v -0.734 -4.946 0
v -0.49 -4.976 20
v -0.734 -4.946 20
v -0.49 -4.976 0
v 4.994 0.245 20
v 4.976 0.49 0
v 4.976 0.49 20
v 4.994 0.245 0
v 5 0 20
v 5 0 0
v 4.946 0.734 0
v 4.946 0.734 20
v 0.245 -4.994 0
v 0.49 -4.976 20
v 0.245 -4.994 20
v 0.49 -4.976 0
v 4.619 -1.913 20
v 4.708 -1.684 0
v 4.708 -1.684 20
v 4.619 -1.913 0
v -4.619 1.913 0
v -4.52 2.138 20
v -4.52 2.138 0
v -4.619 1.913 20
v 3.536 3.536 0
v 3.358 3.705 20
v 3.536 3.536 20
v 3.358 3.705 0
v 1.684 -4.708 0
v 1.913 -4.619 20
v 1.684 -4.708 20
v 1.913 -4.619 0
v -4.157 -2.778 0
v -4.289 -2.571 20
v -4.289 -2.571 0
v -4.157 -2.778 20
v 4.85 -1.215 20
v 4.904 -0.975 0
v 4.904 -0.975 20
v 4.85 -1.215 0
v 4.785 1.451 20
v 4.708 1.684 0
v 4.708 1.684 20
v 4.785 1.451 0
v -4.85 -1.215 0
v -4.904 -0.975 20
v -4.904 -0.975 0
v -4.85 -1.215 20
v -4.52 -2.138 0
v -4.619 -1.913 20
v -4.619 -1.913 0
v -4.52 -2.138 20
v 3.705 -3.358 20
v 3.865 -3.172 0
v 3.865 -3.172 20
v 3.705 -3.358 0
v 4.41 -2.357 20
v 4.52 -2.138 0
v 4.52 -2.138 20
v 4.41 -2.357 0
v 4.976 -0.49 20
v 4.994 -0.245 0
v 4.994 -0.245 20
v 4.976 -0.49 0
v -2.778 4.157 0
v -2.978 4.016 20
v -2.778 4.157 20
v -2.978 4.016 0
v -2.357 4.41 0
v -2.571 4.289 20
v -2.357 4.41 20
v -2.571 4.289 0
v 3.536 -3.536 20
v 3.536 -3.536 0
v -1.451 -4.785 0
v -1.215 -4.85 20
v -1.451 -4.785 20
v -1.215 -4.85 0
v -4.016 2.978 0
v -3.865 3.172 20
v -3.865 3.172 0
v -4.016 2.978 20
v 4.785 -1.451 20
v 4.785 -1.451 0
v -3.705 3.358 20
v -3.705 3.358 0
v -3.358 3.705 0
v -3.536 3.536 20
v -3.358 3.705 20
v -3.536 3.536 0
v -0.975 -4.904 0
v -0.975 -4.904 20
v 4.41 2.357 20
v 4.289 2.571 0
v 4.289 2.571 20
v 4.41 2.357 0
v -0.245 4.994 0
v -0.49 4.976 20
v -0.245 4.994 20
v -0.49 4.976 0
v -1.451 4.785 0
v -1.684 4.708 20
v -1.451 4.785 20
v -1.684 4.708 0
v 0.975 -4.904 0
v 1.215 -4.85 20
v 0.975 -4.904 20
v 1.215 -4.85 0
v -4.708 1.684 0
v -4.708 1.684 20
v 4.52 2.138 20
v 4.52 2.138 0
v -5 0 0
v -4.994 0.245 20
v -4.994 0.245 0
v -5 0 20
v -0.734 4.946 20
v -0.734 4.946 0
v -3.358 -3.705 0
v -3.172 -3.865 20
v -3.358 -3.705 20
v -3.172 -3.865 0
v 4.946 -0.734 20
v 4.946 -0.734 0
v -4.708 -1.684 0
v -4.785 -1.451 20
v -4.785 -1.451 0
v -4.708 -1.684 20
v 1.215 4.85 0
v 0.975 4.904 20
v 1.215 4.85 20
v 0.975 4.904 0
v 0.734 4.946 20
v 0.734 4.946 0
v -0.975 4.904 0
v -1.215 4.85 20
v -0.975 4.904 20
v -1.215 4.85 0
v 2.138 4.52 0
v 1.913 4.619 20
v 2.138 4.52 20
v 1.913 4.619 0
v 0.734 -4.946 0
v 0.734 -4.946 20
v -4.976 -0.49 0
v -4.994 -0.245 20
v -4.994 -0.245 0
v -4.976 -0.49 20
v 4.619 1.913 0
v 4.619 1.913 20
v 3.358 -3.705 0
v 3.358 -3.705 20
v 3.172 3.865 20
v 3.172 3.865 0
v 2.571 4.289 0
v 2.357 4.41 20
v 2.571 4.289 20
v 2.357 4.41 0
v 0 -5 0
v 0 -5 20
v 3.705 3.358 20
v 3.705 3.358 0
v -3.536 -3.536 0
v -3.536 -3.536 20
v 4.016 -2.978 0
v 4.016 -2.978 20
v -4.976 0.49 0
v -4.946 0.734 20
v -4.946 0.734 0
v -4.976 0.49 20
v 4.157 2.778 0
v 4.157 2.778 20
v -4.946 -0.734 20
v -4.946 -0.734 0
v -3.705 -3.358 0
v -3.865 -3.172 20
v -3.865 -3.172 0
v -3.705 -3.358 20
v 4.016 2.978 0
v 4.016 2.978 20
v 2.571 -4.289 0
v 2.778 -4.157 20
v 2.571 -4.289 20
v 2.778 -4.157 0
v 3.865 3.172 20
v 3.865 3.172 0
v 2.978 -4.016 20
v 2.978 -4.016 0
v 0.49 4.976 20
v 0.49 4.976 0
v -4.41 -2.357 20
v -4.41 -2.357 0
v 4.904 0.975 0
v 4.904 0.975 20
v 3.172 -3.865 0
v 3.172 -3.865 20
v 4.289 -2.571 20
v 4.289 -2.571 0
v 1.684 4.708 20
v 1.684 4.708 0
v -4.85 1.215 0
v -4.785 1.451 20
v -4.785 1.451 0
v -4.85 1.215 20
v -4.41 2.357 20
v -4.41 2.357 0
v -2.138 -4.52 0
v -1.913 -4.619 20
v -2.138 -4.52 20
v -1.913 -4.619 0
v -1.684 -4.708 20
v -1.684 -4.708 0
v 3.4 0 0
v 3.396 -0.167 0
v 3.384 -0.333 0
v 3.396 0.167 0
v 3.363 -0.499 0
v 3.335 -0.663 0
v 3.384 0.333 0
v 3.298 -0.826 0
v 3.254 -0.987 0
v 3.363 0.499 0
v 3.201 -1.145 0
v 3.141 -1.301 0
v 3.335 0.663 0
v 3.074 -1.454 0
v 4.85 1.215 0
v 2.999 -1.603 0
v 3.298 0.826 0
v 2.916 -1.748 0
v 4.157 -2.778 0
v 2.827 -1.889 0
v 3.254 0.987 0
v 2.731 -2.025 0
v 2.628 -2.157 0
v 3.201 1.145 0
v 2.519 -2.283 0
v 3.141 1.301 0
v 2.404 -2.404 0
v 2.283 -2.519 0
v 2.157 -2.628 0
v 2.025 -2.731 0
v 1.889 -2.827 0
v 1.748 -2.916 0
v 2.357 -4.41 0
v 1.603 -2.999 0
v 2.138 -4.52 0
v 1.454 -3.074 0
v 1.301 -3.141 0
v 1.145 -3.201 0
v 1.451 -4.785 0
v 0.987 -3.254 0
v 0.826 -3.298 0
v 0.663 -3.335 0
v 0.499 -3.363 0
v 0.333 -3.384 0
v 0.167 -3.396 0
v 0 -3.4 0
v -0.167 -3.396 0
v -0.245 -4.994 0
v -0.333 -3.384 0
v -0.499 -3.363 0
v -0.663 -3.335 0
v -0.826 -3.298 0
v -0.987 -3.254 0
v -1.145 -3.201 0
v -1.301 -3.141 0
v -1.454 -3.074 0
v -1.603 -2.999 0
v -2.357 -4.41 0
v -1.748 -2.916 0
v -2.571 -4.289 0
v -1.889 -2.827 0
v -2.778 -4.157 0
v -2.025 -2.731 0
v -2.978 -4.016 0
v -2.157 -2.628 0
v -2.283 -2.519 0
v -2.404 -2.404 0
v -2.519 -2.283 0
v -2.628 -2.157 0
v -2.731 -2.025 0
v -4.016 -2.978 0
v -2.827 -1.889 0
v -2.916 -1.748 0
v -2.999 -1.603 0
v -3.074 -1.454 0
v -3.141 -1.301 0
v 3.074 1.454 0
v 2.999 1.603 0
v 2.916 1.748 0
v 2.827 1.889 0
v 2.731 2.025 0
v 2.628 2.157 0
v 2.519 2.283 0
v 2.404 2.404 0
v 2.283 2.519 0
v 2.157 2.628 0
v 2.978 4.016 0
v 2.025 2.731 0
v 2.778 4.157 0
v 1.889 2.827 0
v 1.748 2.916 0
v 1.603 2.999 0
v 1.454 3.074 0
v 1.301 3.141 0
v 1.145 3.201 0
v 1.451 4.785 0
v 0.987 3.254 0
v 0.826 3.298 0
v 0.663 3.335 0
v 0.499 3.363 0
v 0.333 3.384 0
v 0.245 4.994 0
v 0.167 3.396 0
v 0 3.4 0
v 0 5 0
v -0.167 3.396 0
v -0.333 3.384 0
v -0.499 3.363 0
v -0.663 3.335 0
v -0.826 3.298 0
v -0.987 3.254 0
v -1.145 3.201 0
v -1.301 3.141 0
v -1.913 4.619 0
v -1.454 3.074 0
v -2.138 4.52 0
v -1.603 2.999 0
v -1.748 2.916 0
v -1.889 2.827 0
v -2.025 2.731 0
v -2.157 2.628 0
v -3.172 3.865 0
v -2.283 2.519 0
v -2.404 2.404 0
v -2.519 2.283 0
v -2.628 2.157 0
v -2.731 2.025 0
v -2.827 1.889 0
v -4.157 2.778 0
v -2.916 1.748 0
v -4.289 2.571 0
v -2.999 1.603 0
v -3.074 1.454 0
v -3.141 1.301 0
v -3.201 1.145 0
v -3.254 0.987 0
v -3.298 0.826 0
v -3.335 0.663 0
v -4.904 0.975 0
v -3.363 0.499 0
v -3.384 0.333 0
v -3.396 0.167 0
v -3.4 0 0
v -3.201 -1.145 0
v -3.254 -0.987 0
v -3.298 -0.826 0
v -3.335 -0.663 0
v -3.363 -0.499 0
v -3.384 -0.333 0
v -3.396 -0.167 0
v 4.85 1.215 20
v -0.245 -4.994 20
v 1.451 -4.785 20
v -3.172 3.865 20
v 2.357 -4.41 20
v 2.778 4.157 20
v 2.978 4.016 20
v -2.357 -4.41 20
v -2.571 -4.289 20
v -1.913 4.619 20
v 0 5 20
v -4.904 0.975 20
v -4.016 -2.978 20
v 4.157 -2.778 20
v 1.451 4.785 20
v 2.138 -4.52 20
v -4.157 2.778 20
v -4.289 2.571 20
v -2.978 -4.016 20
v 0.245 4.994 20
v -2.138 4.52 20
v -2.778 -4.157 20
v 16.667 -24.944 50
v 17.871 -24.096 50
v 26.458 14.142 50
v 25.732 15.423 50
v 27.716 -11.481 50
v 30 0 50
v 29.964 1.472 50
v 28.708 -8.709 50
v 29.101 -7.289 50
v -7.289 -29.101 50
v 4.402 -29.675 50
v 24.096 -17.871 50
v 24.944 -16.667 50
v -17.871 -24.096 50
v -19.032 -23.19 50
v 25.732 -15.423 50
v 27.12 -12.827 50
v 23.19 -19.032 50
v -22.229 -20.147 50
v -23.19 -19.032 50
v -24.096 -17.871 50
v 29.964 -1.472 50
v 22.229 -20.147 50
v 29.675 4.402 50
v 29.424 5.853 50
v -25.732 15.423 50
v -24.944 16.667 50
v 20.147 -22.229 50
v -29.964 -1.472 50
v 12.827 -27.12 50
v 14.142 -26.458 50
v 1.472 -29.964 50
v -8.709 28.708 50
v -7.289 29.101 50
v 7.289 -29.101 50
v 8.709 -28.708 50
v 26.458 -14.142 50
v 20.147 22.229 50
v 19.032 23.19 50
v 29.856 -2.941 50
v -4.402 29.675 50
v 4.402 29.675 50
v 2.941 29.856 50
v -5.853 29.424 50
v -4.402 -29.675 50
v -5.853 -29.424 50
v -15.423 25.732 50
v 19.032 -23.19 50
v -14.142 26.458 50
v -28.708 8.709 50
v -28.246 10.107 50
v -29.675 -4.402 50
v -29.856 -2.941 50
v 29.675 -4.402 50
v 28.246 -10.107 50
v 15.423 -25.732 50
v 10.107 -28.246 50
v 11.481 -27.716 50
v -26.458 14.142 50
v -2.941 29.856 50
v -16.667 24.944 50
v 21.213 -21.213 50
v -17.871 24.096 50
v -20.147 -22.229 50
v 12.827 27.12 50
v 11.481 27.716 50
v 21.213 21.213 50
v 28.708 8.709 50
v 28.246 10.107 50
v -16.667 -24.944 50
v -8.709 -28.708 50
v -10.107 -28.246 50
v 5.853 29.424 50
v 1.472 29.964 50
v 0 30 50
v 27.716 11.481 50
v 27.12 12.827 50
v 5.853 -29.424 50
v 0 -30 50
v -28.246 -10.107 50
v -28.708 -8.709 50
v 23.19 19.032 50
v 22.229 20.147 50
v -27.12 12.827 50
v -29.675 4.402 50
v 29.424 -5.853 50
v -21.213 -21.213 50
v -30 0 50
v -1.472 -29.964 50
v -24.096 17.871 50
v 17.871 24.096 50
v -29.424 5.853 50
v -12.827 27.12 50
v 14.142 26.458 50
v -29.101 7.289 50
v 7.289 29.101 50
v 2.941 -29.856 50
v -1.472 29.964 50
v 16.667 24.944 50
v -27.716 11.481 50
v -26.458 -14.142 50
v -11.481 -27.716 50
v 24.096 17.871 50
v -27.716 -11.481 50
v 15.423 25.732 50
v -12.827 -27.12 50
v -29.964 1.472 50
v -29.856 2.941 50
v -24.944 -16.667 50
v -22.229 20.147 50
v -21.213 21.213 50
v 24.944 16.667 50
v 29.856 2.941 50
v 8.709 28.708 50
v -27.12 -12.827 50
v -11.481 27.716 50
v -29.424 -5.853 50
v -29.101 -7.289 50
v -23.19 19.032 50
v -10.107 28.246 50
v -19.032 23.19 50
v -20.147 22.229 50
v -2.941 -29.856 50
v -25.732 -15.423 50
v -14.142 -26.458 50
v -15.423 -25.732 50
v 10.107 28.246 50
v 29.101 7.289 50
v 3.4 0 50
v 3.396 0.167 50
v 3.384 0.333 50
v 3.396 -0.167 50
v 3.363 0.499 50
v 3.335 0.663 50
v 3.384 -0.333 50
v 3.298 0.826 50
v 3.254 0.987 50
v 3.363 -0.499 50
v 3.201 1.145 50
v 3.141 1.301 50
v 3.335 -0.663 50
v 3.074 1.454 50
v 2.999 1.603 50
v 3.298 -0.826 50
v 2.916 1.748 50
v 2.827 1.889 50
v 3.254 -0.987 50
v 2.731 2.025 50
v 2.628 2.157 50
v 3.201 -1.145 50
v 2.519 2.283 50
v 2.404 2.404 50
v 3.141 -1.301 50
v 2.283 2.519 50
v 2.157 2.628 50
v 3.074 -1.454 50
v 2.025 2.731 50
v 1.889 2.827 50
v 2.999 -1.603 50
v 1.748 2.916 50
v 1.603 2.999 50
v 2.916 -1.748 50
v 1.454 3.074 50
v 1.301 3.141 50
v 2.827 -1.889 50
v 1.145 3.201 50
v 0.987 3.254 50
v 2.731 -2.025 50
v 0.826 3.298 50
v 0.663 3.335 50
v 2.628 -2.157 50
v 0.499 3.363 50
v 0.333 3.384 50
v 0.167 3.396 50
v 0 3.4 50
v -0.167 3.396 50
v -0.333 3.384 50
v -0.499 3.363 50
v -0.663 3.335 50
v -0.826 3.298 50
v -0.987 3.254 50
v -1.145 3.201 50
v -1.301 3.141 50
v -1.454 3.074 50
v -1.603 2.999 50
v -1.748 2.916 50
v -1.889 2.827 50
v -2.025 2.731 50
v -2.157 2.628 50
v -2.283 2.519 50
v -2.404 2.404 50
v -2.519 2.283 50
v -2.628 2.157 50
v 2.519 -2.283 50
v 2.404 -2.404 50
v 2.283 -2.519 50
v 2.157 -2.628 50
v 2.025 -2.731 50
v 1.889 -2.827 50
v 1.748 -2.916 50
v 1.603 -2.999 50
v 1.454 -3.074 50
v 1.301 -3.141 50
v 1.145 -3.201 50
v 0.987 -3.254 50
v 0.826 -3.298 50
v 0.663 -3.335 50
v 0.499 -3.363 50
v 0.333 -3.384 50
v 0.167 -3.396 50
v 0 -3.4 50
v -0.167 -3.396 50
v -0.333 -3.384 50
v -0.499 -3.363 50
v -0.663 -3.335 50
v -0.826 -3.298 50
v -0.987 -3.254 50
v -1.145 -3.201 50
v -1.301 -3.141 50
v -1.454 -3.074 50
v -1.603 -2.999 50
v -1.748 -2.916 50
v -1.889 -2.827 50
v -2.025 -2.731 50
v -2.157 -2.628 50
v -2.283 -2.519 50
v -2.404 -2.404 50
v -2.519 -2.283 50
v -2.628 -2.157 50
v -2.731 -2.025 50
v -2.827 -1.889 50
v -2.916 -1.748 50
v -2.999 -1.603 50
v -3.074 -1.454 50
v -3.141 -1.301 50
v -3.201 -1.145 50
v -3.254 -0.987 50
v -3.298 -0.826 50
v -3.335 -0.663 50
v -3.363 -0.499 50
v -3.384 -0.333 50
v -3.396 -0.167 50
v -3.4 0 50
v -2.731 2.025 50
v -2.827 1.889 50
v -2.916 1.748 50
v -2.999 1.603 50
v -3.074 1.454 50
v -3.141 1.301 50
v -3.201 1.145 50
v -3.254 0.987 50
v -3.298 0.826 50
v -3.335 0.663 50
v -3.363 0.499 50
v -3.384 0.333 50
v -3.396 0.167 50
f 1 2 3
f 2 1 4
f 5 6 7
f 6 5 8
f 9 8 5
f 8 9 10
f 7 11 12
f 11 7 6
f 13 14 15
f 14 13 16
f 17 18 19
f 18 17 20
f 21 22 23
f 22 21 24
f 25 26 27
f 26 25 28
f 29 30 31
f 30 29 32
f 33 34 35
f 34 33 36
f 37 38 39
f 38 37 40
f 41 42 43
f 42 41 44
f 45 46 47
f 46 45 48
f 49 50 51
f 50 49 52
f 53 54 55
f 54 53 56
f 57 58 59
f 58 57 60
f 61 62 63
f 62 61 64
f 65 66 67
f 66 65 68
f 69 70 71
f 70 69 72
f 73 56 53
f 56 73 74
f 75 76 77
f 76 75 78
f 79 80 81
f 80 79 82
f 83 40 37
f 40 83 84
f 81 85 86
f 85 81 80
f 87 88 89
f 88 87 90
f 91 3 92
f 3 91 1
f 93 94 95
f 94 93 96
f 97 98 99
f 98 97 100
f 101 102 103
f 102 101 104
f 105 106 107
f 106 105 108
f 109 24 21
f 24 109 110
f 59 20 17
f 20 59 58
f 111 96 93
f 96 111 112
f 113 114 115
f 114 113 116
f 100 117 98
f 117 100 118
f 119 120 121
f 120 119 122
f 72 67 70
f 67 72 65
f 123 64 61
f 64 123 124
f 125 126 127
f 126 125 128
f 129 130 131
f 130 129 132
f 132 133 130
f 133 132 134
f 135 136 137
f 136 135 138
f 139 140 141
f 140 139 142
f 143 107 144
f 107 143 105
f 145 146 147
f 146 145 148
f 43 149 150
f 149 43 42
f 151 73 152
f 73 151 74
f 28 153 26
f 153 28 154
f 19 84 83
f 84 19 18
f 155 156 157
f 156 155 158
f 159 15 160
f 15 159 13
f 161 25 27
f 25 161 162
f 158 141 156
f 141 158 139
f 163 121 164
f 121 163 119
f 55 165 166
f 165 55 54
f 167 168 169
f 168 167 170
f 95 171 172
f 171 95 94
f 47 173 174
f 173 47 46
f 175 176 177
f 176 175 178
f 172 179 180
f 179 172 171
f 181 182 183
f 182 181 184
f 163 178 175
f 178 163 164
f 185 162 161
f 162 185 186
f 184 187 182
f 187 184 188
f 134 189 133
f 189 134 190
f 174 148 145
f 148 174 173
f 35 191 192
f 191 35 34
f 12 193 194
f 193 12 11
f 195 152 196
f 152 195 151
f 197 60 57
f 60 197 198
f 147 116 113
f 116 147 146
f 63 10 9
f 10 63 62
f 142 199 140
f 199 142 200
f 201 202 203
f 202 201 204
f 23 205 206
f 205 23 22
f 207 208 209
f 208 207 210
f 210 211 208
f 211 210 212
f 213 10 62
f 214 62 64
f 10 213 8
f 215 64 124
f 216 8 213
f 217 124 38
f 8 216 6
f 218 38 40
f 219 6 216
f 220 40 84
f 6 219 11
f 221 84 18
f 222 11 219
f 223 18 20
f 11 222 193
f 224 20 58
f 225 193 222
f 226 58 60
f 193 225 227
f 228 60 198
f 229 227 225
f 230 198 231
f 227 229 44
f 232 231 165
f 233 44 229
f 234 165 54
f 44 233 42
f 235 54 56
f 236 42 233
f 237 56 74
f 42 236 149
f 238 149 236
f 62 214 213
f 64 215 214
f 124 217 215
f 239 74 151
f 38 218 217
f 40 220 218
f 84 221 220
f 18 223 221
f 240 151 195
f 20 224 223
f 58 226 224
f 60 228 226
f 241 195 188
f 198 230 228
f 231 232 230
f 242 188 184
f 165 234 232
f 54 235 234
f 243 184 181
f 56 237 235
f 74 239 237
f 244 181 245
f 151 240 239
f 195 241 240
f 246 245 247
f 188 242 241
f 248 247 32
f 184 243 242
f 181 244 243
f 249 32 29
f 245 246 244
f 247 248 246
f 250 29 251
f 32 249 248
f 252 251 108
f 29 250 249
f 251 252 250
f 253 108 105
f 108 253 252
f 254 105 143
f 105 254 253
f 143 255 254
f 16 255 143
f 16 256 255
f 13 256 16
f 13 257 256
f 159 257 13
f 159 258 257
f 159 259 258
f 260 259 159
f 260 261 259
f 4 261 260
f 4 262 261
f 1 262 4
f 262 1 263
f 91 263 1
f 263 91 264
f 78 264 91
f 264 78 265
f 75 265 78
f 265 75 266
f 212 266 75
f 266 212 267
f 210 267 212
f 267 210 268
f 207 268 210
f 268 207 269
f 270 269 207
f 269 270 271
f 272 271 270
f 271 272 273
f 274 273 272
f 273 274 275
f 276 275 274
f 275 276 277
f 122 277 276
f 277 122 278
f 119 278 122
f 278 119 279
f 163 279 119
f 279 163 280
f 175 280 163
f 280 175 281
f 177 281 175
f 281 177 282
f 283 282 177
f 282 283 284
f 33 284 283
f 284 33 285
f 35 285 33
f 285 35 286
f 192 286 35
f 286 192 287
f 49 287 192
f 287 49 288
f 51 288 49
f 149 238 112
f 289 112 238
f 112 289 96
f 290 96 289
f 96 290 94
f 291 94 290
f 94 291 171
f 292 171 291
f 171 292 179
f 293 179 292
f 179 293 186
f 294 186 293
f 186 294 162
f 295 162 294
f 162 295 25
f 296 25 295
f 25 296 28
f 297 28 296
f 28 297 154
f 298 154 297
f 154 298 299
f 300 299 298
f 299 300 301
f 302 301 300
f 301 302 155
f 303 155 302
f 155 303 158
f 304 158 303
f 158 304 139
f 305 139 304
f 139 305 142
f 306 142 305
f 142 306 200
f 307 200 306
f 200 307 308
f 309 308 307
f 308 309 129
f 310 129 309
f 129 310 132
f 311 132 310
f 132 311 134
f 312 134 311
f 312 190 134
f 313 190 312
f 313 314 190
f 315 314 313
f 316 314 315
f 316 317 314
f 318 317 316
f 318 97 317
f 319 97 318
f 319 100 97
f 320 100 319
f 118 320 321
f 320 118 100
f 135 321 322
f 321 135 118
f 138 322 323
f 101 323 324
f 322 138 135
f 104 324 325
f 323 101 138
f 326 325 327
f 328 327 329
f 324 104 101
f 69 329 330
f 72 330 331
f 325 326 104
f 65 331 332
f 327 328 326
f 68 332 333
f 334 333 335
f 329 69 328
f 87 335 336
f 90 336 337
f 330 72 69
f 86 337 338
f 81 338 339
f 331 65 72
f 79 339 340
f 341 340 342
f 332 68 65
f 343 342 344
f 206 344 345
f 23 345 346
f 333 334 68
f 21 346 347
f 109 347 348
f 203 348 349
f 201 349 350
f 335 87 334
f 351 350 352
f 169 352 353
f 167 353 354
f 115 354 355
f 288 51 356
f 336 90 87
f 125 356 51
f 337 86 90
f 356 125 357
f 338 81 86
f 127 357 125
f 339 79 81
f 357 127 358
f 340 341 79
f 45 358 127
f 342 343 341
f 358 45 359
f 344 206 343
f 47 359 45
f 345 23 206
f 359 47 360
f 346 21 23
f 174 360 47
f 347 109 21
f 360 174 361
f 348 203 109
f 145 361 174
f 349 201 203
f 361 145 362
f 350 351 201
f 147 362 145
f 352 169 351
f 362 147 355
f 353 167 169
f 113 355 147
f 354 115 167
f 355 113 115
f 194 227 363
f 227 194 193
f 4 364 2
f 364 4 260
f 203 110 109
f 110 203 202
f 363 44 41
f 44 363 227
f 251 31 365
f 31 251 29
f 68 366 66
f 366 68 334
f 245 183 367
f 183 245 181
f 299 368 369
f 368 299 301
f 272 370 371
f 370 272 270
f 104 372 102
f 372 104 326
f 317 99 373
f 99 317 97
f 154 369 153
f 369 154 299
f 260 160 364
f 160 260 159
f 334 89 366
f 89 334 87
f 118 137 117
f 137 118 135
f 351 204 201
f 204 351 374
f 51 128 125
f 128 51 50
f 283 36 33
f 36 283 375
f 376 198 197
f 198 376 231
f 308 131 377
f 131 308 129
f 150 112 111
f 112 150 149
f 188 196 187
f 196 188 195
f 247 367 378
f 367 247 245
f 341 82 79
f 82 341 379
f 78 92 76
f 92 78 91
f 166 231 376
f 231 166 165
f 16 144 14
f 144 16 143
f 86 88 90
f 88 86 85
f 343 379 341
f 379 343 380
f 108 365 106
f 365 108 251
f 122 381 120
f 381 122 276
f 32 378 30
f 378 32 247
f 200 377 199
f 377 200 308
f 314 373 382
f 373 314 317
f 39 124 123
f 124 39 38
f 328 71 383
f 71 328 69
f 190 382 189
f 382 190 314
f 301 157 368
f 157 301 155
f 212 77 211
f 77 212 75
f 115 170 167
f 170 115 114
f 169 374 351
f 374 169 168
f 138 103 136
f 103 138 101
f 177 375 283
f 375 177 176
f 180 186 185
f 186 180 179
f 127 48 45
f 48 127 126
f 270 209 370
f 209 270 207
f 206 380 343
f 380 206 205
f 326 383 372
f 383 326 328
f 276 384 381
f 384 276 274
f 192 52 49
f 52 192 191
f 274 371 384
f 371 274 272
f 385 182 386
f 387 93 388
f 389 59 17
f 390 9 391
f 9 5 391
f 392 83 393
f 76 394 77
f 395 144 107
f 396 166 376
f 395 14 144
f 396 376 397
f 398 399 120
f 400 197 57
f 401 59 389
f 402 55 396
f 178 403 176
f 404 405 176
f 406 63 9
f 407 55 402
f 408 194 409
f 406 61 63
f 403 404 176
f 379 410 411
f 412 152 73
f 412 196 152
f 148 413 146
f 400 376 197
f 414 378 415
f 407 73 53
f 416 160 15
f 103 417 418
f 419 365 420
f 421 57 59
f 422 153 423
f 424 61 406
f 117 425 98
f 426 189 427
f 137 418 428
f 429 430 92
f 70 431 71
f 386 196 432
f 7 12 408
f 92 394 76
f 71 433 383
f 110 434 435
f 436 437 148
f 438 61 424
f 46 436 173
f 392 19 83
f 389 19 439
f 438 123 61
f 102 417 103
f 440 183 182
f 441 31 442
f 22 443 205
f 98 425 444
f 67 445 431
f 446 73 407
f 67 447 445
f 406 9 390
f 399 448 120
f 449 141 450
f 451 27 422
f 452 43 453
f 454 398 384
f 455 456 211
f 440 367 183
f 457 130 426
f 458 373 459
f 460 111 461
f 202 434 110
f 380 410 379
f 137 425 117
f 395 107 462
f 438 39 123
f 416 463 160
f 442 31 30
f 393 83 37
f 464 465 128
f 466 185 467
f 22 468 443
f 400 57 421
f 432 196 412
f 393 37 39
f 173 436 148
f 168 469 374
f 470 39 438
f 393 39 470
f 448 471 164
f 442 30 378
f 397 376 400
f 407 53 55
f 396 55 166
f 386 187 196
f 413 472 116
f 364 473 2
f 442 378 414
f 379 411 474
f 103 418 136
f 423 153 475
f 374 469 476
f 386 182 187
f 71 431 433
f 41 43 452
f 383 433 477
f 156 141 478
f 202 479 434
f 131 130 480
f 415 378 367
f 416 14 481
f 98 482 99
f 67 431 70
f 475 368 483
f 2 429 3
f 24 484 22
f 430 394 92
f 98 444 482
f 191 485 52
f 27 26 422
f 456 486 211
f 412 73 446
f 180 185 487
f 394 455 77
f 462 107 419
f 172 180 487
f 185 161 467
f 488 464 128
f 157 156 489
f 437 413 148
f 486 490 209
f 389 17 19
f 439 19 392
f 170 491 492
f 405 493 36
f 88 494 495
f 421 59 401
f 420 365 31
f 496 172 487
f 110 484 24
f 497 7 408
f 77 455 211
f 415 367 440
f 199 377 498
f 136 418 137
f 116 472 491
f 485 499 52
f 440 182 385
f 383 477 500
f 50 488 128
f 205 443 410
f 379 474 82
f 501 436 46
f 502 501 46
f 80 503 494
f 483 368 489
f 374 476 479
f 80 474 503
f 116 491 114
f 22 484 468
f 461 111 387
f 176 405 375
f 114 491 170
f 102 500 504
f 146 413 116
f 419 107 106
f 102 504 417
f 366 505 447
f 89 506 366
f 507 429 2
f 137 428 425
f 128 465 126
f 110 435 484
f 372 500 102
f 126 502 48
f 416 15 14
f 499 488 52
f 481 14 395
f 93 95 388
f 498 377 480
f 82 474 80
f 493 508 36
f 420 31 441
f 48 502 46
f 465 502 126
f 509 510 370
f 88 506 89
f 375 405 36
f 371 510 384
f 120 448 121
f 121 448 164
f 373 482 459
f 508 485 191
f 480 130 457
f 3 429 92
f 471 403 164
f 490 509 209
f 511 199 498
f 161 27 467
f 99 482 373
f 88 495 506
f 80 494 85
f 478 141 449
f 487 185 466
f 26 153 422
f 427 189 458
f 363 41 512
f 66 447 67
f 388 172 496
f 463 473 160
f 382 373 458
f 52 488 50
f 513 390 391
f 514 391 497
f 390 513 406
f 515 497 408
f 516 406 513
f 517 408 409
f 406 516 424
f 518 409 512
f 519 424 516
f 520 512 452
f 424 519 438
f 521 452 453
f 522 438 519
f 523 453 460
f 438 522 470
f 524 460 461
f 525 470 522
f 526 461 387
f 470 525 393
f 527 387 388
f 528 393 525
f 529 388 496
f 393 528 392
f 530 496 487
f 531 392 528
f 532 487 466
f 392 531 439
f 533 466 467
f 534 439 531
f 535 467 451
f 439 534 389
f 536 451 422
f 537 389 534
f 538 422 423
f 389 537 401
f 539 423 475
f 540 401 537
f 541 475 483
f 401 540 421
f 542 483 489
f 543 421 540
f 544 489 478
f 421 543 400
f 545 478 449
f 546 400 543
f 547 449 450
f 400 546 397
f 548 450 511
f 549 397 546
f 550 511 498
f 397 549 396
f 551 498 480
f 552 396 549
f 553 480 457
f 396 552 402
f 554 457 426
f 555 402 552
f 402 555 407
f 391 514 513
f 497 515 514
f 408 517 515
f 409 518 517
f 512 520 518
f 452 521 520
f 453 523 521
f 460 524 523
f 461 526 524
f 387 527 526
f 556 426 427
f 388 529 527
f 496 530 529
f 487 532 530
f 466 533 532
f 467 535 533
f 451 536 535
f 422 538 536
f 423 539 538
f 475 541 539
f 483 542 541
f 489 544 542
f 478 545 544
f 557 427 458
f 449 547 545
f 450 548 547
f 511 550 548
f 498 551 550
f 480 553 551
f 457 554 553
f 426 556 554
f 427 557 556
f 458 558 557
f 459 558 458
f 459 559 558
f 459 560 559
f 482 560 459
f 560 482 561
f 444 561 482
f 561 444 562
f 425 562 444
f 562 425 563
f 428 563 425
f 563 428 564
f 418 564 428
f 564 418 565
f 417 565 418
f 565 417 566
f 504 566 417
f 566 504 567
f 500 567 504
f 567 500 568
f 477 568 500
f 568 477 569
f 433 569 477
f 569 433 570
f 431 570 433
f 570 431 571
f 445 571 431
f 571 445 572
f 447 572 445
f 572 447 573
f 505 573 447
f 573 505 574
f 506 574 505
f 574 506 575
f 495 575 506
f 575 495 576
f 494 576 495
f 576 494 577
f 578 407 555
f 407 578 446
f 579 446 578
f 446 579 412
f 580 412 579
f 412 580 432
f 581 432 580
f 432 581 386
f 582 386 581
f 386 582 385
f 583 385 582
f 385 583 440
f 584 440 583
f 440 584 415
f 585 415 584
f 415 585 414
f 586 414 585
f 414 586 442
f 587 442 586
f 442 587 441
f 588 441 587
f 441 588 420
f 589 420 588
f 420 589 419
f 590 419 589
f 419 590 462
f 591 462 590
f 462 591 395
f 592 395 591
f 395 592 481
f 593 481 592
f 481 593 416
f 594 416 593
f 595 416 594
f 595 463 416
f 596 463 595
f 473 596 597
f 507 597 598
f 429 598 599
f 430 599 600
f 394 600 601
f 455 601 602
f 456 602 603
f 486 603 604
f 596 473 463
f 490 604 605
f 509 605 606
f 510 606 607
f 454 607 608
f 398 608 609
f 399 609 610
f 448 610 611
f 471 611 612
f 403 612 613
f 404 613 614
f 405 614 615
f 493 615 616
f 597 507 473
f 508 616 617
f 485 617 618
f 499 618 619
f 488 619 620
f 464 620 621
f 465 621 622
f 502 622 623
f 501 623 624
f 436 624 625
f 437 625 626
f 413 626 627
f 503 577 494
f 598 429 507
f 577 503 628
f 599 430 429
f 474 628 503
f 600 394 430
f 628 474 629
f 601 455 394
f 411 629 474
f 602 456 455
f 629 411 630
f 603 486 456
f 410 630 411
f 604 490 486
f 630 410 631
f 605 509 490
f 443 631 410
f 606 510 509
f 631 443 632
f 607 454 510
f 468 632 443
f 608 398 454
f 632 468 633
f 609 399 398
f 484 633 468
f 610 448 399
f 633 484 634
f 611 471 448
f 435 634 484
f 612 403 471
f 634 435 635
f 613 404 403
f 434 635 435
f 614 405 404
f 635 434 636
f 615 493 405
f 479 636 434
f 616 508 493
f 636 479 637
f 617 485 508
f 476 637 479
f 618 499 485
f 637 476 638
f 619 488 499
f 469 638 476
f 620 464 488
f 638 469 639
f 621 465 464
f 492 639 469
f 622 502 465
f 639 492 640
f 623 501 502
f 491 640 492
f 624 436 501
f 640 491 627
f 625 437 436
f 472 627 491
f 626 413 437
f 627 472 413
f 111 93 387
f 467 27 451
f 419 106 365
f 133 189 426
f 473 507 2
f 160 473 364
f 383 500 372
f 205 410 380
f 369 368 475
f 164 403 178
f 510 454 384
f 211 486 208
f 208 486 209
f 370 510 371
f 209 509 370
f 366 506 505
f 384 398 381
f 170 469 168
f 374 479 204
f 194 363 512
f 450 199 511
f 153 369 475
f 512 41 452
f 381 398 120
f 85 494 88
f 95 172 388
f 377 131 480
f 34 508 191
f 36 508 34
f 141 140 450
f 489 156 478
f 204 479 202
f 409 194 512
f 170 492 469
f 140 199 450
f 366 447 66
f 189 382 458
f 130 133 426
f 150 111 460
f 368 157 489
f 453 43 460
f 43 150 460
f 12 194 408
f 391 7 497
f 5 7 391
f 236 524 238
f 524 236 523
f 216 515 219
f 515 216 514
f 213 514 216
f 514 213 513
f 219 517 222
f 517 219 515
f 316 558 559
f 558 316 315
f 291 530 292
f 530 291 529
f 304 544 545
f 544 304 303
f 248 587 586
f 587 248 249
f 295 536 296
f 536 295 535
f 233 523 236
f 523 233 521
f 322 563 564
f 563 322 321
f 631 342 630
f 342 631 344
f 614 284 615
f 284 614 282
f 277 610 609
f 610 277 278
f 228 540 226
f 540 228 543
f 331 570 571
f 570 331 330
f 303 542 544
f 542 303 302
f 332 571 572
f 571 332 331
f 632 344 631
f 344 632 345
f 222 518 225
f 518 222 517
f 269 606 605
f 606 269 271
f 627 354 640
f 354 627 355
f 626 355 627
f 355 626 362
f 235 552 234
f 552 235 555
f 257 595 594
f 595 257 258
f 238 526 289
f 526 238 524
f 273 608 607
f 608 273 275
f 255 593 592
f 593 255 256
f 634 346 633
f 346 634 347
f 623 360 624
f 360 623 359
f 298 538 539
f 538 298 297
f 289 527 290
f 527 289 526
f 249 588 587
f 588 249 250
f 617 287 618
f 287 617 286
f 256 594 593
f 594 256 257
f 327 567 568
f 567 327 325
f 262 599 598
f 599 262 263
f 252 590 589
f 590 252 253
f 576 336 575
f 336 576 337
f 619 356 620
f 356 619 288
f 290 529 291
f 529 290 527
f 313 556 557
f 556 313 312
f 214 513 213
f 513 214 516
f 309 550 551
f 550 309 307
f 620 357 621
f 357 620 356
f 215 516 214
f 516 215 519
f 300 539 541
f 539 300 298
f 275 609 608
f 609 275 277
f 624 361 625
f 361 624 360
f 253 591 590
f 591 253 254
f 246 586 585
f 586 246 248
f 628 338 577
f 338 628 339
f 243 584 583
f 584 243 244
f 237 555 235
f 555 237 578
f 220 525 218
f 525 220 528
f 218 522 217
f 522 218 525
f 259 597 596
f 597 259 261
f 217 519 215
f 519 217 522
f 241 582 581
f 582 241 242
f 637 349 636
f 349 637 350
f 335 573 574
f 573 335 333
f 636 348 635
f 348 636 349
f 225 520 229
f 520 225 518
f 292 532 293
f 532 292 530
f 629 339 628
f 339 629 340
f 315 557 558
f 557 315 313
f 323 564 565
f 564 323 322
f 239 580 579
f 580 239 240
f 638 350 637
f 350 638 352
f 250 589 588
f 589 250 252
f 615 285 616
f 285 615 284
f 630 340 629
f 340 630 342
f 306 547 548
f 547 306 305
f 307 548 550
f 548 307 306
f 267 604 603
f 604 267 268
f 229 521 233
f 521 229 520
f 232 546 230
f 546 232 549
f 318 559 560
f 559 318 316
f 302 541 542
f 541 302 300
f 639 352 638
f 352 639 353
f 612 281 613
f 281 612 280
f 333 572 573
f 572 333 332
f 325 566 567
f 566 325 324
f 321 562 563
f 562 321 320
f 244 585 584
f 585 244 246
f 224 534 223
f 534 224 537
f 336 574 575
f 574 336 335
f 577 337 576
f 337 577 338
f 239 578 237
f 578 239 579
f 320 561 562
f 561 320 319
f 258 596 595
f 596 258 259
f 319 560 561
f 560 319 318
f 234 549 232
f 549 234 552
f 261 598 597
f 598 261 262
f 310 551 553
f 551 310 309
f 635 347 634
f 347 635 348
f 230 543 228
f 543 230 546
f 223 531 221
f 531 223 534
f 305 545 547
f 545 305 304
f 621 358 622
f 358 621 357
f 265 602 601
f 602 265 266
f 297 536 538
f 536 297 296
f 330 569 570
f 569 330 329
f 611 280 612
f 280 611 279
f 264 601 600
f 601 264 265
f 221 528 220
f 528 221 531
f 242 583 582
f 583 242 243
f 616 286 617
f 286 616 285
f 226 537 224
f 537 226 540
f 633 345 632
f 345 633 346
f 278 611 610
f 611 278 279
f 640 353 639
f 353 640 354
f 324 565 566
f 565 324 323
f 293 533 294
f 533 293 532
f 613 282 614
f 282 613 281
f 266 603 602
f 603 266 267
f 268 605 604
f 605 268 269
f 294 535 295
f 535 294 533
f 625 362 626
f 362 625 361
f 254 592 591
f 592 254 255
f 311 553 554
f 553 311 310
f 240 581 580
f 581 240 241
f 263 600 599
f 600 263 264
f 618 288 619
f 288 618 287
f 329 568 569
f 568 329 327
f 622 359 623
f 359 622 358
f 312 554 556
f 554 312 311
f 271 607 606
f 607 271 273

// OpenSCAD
// Small lab funnel - printed upright, open top and bottom
// Units: mm. One complete part, no external libraries.

// ---- Parameters ----
spout_od      = 10;    // spout outer diameter
spout_length  = 20;    // spout runs from z = 0 to z = 20
cone_bottom_d = 10;    // cone outer diameter at z = 20 (spout top)
cone_top_d    = 60;    // cone outer diameter at rim (z = 50)
cone_top_z    = 50;    // rim height
wall          = 1.6;   // uniform wall thickness (spout bore = 6.8 mm)
eps           = 0.5;   // cutter overshoot past faces

$fn = 128;             // smoothness of curved surfaces

// ---- Derived ----
cone_height = cone_top_z - spout_length;   // 30 mm

// ---- Model ----
difference() {
    union() {
        // Spout: straight tube from z = 0 to z = 20
        cylinder(d = spout_od, h = spout_length);

        // Cone: widens from 10 mm at z = 20 to 60 mm at z = 50
        translate([0, 0, spout_length])
            cylinder(d1 = cone_bottom_d, d2 = cone_top_d, h = cone_height);
    }
    // Through-bore: 6.8 mm from bottom to rim (open top and bottom)
    translate([0, 0, -eps])
        cylinder(d = spout_od - 2 * wall, h = cone_top_z + 2 * eps);
}
